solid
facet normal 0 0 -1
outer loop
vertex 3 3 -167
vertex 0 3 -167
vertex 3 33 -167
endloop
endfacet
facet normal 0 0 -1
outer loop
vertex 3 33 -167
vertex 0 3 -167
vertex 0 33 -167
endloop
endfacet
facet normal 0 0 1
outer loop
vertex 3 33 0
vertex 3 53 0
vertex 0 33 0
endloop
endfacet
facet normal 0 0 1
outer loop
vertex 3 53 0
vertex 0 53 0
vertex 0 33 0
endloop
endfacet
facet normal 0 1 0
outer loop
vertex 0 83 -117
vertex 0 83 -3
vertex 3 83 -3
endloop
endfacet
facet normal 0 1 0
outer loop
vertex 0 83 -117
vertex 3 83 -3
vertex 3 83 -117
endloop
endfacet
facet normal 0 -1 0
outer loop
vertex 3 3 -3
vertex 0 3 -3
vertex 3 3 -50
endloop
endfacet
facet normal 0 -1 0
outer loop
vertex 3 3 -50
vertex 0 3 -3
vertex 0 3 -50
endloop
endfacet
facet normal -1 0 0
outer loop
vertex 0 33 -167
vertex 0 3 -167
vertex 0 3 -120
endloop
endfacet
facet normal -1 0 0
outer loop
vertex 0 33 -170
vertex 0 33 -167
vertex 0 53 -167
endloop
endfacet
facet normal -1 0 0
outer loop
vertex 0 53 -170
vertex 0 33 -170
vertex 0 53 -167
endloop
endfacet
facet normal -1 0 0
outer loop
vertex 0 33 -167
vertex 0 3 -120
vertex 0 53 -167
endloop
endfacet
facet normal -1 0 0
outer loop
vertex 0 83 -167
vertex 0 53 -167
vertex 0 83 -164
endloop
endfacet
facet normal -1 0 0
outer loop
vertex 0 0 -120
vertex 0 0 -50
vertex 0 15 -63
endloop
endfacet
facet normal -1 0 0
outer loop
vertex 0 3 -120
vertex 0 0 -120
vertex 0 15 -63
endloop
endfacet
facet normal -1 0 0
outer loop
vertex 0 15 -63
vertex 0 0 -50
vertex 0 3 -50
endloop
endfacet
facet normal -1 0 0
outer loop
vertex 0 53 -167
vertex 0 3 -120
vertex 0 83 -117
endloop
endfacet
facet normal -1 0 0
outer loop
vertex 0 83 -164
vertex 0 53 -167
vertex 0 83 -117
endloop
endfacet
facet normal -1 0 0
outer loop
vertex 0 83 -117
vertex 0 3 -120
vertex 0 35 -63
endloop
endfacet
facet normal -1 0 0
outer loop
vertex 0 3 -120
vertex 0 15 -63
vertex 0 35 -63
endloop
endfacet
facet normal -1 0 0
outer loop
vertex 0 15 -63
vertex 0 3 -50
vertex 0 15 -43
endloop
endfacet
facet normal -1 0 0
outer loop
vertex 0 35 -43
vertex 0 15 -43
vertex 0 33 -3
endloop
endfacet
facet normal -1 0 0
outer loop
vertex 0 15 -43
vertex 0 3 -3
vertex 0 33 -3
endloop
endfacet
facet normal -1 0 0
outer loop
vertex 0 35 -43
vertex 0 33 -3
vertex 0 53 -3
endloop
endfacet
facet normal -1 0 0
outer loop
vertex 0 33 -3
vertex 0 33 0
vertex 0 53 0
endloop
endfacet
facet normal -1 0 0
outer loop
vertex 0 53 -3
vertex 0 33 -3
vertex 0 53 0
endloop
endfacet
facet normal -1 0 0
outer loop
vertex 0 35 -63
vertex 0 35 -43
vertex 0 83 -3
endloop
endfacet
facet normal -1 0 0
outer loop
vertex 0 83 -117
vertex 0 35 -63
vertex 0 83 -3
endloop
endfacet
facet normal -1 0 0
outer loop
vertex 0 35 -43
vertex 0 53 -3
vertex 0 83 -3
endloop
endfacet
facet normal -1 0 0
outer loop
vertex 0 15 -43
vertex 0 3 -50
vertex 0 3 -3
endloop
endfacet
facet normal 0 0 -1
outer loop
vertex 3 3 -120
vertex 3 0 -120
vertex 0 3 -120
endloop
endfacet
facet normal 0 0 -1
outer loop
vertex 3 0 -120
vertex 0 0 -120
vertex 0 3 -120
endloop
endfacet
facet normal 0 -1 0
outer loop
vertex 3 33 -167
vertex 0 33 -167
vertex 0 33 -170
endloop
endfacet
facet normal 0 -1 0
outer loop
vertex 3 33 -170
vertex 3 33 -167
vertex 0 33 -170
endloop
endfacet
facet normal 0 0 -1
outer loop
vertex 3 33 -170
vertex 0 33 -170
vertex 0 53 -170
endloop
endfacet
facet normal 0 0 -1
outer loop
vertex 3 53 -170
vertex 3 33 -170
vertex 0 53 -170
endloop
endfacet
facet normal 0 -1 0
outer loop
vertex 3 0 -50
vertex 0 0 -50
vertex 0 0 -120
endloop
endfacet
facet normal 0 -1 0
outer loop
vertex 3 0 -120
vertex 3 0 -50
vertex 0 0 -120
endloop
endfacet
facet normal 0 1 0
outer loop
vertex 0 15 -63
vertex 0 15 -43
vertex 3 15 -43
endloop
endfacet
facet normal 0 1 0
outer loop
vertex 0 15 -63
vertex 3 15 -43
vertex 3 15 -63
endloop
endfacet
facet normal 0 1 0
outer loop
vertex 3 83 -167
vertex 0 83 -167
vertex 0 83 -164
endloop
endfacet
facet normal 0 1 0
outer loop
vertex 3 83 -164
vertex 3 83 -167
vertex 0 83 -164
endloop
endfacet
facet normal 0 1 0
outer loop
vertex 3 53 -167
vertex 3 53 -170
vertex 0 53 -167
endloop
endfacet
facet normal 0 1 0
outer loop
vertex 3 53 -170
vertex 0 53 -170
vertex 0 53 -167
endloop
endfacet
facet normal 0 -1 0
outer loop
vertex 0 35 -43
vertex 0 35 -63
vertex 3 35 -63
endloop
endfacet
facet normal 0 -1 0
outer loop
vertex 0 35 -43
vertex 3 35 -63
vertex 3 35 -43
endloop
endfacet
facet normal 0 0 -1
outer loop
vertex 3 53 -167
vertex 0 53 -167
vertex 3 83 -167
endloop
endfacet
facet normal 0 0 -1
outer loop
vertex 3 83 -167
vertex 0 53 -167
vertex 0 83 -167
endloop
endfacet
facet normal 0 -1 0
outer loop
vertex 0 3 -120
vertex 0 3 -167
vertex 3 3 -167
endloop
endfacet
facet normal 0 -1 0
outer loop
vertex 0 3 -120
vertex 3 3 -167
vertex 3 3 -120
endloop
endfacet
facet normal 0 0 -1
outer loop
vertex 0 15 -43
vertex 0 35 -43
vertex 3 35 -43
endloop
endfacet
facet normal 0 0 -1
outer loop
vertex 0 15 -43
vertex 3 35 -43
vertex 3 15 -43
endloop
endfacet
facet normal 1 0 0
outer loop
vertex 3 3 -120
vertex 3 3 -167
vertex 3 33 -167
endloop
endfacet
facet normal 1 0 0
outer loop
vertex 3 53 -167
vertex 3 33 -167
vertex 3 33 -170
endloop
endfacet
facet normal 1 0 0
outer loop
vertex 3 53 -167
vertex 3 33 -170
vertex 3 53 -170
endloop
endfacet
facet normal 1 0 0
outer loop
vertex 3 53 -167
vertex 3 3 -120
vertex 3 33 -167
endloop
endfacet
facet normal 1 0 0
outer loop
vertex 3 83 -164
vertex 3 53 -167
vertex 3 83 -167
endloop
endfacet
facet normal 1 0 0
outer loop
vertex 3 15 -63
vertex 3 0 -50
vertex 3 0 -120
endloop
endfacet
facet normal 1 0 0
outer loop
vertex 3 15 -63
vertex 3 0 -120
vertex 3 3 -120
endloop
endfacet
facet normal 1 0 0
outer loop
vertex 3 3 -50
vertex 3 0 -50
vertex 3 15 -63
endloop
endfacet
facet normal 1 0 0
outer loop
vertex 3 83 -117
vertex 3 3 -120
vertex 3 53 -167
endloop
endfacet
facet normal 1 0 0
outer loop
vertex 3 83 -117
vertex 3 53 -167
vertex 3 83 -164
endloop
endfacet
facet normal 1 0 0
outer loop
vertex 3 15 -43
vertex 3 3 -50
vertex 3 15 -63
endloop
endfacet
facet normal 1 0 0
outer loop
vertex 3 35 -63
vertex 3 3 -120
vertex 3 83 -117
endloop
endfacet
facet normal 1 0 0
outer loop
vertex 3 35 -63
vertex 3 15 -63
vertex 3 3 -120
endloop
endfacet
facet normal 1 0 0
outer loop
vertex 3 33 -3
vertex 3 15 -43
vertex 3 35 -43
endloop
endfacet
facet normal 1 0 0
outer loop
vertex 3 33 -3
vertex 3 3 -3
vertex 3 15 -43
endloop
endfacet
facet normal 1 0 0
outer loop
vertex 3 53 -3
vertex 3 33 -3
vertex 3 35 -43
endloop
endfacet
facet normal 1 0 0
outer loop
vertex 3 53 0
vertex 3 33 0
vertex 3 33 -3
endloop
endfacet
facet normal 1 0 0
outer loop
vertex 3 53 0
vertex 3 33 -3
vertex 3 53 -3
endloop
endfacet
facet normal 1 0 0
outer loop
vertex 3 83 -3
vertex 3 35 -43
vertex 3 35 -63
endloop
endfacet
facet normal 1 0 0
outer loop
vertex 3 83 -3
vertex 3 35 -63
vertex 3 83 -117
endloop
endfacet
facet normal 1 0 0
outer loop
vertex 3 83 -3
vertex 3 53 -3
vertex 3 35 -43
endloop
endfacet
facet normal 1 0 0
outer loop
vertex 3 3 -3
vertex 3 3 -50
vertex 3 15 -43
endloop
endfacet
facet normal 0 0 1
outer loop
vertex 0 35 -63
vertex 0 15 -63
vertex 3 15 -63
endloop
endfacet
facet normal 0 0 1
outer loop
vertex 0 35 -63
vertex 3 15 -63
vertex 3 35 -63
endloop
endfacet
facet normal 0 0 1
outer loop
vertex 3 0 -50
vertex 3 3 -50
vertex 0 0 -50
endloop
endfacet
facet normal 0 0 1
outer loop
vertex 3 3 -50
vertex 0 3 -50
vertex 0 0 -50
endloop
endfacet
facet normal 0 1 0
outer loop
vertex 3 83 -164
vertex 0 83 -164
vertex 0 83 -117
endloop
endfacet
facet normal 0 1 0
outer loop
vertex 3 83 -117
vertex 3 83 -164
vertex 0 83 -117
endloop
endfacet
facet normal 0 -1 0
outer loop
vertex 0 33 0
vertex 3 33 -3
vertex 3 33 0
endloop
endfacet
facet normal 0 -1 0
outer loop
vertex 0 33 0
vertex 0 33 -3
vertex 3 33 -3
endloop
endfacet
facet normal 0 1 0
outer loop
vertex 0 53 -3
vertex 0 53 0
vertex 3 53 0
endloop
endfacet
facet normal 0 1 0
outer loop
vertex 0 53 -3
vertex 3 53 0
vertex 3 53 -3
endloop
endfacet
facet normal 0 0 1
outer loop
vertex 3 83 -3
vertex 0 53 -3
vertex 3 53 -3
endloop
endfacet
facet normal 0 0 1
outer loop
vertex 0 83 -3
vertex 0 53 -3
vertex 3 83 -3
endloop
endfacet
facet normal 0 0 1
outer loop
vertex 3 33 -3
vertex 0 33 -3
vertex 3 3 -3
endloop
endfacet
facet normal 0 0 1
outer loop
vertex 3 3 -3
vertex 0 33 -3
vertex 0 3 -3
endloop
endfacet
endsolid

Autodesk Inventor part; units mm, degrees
ref_plane "YZ Plane" through (0, 0, 0) normal (1, 0, 0) x (0, 1, 0)
ref_plane "XZ Plane" through (0, 0, 0) normal (0, 1, 0) x (-1, 0, 0)
ref_plane "XY Plane" through (0, 0, 0) normal (0, 0, 1) x (1, 0, 0)
sketch "Sketch2" plane through (0, 0, 0) normal (1, 0, 0) x (0, 1, 0)
  line L0 (0, 0) -> (3, 0) construction
  line L1 (3, -3) -> (3, -50)
  line L2 (3, -50) -> (0, -50)
  line L3 (0, -50) -> (0, -120)
  line L4 (0, -120) -> (3, -120)
  line L5 (53, 0) -> (53, -3)
  line L6 (33, -3) -> (33, 0)
  line L7 (0, 0) -> (0, -43) construction
  line L8 (0, -43) -> (15, -43) construction
  line L9 (15, -43) -> (35, -43) construction
  line L10 (15, -43) -> (15, -63)
  line L11 (15, -63) -> (35, -63)
  line L12 (35, -63) -> (35, -43)
  line L13 (35, -43) -> (15, -43)
  line L14 (83, -164) -> (83, -117)
  line L15 (3, -167) -> (3, -120)
  line L16 (3, -167) -> (33, -167)
  line L17 (33, -167) -> (33, -170)
  line L18 (33, -170) -> (53, -170)
  line L19 (53, -170) -> (53, -167)
  line L20 (53, -167) -> (83, -167)
  line L21 (83, -167) -> (83, -164)
  line L22 (53, -3) -> (83, -3)
  line L23 (53, 0) -> (33, 0)
  line L24 (33, -3) -> (3, -3)
  line L25 (83, -3) -> (83, -117)
  dimension "d0" = 3
  dimension "d1" = 3
  dimension "d2" = 47
  dimension "d3" = 70
  dimension "d11" = 3
  dimension "d12" = 20
  dimension "d15" = 43
  dimension "d16" = 15
  dimension "d17" = 20
  dimension "d18" = 20
  dimension "d19" = 47
  dimension "d20" = 30
  dimension "d21" = 3
  dimension "d22" = 20
extrude "Extrusion1" add sketch "Sketch2" along normal blind 3
properties part number "Kiri"
